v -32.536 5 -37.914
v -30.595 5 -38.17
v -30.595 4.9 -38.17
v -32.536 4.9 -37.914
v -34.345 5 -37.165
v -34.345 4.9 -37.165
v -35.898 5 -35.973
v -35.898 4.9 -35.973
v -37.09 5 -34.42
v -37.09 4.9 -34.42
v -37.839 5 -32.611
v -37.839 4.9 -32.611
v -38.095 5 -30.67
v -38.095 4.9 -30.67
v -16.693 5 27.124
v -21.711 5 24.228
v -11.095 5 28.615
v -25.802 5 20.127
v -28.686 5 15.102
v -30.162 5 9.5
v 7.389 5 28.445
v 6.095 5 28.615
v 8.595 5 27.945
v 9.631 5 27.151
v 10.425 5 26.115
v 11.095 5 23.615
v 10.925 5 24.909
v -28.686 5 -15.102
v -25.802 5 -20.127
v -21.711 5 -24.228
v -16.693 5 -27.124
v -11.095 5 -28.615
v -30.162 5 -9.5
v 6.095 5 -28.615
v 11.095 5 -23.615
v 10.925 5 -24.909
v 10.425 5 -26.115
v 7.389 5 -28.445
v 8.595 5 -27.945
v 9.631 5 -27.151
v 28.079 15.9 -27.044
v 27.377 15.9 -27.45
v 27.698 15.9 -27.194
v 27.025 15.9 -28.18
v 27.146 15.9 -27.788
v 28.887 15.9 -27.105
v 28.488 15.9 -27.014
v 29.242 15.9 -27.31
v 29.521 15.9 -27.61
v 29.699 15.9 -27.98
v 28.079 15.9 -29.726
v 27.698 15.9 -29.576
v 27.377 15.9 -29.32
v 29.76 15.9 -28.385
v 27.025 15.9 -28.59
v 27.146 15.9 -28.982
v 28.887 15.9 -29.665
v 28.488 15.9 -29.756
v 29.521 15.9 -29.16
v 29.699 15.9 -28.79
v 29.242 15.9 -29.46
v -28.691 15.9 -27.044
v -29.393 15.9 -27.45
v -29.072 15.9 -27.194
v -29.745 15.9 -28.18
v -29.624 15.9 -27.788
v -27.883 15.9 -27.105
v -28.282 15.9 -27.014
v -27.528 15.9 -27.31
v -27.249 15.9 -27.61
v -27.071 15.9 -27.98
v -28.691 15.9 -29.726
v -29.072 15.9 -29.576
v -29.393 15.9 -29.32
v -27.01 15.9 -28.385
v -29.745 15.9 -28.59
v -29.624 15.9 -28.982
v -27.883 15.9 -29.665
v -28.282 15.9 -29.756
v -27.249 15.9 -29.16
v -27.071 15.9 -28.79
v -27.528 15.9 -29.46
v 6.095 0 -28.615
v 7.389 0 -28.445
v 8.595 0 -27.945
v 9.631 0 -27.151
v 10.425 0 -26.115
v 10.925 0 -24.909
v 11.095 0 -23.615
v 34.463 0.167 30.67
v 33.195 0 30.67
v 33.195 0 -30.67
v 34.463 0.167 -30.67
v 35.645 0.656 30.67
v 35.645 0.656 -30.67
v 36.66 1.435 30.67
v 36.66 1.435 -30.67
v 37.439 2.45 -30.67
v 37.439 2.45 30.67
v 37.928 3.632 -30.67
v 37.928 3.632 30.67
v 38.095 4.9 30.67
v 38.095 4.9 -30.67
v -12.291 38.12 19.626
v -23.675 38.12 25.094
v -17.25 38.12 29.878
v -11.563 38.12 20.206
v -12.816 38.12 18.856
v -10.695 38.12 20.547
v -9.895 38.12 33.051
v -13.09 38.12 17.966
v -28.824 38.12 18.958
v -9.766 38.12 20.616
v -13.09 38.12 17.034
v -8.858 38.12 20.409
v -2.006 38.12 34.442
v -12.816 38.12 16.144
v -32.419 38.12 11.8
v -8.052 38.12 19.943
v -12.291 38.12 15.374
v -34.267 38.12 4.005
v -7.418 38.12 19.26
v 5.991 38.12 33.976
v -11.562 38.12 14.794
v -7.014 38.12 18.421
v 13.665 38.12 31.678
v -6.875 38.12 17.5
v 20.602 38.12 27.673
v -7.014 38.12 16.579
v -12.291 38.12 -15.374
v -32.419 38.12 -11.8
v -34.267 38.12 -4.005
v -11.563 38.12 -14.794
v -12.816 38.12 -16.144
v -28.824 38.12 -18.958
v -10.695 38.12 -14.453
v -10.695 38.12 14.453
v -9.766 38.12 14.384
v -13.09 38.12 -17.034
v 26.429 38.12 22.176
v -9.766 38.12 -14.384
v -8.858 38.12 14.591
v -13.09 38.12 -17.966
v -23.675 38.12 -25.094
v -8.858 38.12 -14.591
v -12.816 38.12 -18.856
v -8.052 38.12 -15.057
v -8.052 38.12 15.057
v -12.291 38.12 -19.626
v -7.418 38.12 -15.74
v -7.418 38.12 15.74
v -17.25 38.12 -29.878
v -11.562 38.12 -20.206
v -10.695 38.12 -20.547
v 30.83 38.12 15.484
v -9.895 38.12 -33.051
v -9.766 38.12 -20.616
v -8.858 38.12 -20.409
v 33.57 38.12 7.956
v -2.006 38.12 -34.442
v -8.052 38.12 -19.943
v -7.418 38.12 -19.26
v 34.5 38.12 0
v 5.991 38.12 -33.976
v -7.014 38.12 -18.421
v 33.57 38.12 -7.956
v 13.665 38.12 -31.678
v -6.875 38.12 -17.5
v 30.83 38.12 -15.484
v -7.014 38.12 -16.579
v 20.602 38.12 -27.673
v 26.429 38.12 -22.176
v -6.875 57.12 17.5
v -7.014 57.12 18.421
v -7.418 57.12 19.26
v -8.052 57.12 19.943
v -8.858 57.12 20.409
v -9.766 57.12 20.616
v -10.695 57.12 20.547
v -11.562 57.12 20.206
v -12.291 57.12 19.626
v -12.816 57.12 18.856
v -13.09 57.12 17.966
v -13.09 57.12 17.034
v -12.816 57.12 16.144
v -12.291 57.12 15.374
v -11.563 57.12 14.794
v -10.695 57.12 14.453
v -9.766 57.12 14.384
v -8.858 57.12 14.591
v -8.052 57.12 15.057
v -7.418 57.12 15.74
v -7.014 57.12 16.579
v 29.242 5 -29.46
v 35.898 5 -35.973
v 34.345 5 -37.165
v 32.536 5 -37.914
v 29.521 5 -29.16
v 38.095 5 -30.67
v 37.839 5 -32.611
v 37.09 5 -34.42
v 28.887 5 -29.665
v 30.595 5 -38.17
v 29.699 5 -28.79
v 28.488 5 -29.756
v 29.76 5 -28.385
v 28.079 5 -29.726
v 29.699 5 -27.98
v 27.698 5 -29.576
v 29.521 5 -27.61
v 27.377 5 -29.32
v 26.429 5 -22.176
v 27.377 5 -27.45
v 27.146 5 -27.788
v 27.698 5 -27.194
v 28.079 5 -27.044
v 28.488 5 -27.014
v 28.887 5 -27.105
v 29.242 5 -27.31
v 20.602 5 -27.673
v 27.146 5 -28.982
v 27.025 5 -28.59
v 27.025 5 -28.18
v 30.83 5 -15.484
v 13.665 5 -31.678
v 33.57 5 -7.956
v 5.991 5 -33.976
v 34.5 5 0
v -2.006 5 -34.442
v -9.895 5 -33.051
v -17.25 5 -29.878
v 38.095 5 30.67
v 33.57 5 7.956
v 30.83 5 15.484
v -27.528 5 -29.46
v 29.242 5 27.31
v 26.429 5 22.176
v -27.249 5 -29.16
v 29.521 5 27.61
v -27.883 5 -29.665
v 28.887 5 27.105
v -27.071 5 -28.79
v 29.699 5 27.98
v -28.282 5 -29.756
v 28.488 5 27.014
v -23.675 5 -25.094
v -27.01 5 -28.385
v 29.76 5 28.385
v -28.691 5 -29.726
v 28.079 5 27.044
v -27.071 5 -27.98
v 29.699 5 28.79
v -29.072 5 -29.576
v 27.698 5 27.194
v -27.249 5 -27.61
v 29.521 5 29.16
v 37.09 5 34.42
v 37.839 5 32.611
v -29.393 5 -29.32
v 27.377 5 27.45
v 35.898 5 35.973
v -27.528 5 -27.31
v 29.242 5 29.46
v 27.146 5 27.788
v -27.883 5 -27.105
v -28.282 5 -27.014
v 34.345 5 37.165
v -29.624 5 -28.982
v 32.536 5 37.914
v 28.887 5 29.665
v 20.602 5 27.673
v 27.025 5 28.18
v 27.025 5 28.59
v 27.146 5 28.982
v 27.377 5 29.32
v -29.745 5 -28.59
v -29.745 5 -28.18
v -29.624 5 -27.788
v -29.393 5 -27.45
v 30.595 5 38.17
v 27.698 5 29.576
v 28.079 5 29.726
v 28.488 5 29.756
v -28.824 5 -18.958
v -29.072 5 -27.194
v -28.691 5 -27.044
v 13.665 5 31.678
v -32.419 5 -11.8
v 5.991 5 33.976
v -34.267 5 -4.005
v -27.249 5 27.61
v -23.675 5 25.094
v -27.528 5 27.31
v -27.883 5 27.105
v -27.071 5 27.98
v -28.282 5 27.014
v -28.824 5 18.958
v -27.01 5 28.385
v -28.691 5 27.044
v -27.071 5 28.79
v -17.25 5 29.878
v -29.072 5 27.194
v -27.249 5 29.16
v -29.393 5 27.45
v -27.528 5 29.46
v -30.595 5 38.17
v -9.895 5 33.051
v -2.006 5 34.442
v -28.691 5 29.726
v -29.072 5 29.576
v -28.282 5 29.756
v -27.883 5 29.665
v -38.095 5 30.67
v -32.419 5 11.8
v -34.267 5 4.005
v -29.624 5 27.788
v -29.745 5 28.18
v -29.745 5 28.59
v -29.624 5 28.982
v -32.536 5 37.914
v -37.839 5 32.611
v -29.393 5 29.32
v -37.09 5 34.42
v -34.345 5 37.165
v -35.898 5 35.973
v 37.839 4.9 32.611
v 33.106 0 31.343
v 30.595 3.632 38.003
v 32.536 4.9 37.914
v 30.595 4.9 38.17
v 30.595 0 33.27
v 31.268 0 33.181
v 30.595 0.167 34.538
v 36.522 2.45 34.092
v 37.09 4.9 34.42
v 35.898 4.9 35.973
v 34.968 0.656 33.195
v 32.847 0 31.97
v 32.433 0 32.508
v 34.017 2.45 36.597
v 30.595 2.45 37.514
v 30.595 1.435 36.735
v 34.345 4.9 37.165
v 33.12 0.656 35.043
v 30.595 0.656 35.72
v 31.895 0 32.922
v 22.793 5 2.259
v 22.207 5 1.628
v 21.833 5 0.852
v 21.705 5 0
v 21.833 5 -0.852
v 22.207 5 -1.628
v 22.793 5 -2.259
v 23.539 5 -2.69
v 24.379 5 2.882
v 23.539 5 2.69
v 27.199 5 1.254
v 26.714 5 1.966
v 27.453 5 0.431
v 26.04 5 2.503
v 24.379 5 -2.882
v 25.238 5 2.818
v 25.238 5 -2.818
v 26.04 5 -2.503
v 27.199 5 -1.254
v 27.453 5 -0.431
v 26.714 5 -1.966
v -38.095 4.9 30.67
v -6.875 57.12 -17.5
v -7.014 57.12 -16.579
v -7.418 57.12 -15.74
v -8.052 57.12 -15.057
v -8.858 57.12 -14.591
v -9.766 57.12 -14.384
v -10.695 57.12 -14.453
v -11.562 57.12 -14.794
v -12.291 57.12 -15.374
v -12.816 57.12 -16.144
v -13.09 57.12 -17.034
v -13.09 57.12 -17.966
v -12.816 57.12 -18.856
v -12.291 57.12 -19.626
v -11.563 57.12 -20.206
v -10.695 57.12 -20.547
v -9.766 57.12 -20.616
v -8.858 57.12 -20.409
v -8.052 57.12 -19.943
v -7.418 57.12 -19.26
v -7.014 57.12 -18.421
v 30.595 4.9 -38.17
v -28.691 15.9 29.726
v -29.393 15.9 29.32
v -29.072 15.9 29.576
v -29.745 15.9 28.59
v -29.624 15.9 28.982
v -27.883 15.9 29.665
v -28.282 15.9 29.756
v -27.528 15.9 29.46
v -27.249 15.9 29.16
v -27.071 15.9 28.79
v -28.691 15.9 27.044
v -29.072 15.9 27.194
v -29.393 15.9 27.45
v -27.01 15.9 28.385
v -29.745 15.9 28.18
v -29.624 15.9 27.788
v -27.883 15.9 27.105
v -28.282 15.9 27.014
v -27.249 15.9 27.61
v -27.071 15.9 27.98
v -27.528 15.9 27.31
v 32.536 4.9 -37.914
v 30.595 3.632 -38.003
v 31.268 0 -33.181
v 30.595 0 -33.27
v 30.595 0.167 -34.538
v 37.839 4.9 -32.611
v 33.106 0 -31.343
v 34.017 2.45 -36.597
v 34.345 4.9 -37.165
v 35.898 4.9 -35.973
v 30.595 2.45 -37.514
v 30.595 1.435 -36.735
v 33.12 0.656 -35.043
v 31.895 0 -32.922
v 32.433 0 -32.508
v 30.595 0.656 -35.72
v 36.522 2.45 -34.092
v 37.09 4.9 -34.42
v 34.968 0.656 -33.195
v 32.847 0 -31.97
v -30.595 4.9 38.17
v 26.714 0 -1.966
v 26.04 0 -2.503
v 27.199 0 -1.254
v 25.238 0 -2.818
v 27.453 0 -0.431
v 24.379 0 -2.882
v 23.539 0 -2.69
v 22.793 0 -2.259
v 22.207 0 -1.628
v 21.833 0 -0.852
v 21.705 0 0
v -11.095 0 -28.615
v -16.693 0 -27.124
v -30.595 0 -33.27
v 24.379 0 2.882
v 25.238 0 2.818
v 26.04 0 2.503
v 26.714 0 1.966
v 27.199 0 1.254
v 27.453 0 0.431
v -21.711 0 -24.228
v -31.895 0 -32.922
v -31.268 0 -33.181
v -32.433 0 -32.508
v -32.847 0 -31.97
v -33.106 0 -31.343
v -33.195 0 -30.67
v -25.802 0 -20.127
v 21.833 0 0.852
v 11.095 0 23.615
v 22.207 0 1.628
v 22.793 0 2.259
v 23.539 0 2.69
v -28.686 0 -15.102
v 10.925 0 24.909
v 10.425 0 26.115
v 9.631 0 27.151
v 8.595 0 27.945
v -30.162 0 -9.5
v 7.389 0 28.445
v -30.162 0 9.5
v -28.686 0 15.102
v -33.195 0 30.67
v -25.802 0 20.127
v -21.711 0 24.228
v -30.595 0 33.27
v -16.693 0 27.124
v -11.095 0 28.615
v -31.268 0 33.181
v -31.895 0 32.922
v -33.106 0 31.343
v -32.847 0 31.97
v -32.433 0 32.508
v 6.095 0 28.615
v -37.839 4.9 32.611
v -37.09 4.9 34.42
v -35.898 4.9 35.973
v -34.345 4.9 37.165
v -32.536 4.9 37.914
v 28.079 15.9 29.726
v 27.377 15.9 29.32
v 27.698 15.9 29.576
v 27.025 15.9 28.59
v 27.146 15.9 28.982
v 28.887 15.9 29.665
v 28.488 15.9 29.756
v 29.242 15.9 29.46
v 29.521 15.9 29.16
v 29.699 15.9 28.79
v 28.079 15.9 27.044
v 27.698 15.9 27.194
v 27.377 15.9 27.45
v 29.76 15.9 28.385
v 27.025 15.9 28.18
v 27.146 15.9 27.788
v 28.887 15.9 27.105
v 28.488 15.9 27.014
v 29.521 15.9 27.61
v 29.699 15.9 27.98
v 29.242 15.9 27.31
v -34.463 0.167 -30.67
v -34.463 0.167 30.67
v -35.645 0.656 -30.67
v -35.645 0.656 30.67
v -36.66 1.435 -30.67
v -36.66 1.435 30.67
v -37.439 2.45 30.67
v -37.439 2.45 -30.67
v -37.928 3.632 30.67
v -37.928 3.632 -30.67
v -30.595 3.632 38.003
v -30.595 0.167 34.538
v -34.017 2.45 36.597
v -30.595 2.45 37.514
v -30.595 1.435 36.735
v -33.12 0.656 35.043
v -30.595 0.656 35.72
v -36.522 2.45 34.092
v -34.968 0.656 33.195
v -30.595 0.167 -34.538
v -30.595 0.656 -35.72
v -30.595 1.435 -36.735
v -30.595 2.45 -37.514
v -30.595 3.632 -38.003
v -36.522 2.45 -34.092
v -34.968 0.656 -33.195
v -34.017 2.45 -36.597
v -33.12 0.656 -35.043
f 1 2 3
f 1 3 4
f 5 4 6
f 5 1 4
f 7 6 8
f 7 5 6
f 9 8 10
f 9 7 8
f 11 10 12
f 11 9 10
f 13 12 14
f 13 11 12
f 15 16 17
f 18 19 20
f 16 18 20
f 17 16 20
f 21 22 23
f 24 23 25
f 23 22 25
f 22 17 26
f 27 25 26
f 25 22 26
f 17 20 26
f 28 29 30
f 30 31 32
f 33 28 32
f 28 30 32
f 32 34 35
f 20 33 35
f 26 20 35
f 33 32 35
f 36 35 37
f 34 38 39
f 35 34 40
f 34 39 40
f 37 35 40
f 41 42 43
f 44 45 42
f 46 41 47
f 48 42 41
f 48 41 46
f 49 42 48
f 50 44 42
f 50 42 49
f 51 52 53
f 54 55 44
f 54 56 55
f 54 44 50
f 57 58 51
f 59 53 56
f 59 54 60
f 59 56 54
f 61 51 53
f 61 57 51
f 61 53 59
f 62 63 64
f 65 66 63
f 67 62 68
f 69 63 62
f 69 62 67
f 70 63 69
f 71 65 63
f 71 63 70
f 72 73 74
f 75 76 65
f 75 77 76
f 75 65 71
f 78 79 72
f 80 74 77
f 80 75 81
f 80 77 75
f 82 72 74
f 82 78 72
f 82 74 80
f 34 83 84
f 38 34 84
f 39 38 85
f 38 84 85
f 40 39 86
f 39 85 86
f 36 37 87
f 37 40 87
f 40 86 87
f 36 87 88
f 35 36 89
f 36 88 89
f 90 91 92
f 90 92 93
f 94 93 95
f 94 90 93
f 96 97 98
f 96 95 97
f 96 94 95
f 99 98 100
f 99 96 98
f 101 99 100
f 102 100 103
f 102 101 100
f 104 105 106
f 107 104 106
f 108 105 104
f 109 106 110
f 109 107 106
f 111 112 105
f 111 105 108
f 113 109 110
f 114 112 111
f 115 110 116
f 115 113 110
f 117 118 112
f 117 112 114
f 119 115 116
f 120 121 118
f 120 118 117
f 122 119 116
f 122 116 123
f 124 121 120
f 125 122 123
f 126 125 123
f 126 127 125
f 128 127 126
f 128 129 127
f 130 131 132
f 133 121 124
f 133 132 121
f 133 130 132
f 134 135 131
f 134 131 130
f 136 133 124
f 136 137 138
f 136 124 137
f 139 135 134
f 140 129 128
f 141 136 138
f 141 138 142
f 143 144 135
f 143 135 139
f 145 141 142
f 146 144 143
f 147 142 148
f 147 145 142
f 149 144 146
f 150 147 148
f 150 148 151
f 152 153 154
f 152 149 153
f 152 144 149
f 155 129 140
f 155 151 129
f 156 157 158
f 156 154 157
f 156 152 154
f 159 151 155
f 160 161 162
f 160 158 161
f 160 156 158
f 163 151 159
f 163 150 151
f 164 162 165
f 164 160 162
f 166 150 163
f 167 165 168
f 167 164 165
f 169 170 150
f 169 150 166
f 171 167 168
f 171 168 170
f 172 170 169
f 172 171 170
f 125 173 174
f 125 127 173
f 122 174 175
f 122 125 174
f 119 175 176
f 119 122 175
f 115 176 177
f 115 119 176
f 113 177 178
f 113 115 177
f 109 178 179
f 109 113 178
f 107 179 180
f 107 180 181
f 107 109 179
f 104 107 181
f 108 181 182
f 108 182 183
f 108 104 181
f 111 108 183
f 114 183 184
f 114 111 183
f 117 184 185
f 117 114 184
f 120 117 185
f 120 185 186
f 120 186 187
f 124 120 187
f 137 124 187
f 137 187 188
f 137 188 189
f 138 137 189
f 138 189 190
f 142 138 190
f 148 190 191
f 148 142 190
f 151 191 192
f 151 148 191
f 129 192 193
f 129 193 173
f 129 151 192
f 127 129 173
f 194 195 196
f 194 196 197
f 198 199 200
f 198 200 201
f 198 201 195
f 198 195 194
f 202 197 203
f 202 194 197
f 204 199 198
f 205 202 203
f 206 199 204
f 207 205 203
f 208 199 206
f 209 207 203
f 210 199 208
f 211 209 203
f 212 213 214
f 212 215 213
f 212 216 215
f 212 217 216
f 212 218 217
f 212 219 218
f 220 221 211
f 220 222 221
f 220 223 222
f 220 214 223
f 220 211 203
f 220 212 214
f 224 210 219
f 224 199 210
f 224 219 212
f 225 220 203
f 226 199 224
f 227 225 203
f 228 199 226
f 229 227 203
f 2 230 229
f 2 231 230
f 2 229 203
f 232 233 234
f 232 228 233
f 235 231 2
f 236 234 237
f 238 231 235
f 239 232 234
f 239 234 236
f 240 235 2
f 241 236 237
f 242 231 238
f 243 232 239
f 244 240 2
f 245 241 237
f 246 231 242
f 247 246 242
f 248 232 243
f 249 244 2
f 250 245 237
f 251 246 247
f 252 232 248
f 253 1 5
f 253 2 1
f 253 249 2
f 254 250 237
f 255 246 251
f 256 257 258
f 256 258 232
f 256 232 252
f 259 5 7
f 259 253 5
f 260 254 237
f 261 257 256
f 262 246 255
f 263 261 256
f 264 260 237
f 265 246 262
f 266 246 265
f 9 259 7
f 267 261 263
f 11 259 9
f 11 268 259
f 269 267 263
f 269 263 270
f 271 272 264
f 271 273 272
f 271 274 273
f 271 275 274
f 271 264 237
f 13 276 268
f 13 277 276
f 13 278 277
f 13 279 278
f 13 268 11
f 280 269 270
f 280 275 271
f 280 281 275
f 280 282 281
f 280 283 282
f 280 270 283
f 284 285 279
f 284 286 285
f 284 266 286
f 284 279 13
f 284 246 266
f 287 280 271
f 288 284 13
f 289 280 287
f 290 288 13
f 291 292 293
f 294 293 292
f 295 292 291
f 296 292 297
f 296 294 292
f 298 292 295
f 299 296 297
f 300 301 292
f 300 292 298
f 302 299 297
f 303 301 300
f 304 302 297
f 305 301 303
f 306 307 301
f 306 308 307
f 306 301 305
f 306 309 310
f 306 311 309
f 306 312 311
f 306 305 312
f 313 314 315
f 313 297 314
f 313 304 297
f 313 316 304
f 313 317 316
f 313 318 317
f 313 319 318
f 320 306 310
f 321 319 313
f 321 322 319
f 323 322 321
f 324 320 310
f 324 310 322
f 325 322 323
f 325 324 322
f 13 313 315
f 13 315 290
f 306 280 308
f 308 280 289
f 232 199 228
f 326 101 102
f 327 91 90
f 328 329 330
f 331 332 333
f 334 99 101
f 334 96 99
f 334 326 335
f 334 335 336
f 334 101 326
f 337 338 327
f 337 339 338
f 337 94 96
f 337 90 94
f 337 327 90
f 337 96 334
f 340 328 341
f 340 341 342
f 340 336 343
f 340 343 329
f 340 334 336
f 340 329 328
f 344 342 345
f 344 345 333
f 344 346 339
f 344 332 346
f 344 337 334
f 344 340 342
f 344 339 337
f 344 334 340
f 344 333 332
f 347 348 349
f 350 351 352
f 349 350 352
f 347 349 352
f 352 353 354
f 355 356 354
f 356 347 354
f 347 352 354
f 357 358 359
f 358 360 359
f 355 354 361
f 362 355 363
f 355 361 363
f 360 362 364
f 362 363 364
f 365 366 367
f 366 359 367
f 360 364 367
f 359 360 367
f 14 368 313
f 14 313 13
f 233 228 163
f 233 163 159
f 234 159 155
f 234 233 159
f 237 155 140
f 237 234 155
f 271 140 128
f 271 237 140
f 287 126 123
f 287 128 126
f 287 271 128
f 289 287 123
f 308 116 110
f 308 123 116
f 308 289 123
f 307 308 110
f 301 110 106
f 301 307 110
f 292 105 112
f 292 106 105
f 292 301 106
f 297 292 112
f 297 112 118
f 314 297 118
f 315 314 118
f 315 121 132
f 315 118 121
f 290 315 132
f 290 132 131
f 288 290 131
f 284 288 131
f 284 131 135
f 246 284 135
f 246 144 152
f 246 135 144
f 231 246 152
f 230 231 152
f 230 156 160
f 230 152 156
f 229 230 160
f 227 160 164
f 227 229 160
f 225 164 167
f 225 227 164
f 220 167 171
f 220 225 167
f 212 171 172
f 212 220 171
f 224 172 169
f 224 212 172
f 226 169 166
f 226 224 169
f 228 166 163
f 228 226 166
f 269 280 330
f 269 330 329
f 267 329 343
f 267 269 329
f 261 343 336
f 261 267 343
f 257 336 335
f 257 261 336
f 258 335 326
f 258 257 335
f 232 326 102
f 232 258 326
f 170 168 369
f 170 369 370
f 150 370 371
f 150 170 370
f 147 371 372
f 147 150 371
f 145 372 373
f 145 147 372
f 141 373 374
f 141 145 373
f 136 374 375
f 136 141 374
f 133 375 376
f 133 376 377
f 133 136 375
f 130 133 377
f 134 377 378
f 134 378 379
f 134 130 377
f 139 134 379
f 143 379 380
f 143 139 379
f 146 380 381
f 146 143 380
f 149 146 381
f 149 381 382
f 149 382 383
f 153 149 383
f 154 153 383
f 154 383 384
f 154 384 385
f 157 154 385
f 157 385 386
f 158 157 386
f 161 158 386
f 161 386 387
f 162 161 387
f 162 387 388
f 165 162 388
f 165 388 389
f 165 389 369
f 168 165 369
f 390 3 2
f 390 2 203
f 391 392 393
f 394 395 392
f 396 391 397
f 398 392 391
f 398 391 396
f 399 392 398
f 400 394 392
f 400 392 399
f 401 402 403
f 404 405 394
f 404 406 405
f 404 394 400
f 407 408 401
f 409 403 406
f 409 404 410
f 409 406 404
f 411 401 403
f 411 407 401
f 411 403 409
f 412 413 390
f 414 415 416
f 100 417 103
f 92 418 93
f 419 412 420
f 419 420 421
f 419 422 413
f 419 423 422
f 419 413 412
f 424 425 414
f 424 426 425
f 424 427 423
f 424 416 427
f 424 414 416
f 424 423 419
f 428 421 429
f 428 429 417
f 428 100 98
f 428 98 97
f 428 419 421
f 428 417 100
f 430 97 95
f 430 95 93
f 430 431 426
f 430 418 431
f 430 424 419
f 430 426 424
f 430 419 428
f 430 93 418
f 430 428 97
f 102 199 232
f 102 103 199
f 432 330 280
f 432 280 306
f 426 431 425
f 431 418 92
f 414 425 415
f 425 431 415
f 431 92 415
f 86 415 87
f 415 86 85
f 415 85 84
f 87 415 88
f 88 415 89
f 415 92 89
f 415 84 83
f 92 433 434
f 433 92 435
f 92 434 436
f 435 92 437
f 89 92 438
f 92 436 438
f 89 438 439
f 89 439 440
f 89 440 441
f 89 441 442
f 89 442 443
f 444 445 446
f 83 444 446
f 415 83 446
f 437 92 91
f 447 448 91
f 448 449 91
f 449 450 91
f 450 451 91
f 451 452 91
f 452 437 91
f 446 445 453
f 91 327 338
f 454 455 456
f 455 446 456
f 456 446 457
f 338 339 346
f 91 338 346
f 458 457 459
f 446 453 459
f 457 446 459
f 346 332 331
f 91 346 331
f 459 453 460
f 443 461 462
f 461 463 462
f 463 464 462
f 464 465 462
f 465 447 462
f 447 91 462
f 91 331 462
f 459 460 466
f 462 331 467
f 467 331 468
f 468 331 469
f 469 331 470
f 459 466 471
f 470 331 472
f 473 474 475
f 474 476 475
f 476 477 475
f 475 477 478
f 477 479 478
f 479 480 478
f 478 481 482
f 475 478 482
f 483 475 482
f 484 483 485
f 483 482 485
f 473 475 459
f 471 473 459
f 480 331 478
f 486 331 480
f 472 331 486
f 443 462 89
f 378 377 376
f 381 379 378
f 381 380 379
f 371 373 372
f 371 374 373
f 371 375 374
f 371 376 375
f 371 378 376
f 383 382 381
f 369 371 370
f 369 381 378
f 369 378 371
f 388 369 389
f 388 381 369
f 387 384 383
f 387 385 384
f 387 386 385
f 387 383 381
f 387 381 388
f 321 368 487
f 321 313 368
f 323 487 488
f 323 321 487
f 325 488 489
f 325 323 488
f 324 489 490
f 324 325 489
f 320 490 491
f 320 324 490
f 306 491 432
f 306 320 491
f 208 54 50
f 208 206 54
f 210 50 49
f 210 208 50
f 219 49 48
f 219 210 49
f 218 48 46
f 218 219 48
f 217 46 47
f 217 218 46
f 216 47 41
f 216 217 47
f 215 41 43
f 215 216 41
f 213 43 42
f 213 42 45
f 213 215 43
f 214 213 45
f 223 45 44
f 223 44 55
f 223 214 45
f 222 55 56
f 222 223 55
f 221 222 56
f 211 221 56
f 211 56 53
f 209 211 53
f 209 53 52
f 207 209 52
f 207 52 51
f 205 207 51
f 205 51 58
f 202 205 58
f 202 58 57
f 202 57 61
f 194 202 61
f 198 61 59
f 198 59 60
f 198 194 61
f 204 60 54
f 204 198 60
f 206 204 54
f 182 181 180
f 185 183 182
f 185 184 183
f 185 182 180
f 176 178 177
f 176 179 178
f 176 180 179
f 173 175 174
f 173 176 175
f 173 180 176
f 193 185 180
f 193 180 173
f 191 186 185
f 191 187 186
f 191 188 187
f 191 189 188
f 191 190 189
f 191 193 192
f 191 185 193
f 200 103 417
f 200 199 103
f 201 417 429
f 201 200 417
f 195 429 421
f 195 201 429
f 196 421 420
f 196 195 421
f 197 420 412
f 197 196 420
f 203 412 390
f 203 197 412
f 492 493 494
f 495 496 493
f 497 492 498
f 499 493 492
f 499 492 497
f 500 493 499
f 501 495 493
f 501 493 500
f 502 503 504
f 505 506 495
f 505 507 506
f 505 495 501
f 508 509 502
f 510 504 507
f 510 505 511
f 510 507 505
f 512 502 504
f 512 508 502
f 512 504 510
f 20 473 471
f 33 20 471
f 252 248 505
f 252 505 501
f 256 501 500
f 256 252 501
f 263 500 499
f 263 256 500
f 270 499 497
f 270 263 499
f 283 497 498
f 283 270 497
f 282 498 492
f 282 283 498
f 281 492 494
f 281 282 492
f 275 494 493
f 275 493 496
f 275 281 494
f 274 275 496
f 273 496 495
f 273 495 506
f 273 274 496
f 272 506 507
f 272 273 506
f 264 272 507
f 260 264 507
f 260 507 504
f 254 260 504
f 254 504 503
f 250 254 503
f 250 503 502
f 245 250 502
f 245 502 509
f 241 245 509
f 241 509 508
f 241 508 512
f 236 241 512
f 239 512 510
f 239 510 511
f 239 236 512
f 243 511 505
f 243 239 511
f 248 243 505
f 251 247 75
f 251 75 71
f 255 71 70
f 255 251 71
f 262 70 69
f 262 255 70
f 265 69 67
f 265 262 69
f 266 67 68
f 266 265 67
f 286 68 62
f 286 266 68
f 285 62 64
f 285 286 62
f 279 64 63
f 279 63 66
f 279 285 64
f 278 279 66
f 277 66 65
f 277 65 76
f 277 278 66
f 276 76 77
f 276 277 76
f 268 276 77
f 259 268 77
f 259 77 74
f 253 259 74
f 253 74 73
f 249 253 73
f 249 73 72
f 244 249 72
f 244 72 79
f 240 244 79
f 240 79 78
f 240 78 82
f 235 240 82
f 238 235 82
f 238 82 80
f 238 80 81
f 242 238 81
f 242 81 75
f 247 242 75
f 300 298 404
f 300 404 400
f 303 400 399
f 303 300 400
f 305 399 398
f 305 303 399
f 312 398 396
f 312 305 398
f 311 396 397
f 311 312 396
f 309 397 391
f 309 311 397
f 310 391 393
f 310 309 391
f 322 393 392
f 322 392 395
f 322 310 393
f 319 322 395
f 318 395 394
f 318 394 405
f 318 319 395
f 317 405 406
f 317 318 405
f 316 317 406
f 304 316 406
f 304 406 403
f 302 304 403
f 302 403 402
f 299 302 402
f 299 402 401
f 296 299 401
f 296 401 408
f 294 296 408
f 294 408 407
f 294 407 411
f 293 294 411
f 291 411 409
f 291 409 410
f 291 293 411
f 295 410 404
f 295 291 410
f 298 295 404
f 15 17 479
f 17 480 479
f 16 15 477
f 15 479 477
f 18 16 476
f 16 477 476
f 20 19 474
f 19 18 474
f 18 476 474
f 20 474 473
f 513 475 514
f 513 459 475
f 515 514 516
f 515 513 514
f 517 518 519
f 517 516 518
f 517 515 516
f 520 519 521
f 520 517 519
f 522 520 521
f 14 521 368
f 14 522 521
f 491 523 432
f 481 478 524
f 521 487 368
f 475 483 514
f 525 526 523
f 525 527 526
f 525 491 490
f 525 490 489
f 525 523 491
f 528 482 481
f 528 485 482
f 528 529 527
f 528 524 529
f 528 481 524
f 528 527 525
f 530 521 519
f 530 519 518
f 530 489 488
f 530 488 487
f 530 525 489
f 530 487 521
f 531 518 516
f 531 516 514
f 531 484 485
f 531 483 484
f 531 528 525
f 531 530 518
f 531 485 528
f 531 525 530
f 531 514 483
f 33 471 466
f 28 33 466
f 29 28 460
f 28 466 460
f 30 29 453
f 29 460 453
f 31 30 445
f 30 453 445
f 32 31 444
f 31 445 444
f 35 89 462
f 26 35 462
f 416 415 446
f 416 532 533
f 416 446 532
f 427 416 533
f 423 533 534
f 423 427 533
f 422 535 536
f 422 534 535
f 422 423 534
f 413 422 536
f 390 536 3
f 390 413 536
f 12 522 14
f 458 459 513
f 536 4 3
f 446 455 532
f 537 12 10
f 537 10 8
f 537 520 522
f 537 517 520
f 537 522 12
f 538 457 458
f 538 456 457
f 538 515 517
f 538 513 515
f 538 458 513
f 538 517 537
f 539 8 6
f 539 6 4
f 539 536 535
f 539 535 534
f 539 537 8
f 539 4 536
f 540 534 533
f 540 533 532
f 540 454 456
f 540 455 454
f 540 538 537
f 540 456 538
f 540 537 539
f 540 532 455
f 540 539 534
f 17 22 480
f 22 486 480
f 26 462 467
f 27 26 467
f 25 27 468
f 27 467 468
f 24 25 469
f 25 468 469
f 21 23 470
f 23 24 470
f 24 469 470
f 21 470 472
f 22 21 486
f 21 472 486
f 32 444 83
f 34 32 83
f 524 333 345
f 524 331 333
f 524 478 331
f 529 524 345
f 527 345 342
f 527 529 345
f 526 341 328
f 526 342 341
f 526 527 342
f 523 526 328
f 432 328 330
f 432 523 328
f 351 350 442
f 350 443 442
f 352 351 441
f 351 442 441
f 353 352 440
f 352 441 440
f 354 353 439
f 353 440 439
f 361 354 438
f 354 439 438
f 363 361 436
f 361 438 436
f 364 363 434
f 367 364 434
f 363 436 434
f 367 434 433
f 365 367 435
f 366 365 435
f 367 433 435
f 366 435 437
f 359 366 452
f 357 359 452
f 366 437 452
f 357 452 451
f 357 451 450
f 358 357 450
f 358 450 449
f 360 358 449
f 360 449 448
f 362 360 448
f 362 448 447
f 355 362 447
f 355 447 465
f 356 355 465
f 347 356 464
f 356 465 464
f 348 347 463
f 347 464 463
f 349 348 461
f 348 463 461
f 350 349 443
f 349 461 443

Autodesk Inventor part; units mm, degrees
ref_plane "YZ Plane" through (0, 0, 0) normal (1, 0, 0) x (0, 1, 0)
ref_plane "XZ Plane" through (0, 0, 0) normal (0, 1, 0) x (-1, 0, 0)
ref_plane "XY Plane" through (0, 0, 0) normal (0, 0, 1) x (1, 0, 0)
sketch "Sketch1" plane through (0, 0, 0) normal (0, 1, 0) x (-1, 0, 0)
  line L0 (-38.095, 38.17) -> (38.095, 38.17)
  line L1 (38.095, 38.17) -> (38.095, -38.17)
  line L2 (38.095, -38.17) -> (-38.095, -38.17)
  line L3 (-38.095, -38.17) -> (-38.095, 38.17)
  line L4 (-38.095, 38.17) -> (38.095, -38.17) construction
  line L5 (38.095, 38.17) -> (-38.095, -38.17) construction
  line L6 (-6.095, 28.615) -> (11.095, 28.615)
  line L7 (11.095, -28.615) -> (-6.095, -28.615)
  line L8 (-11.095, -23.615) -> (-11.095, 23.615)
  line L9 (-11.095, 28.615) -> (11.095, -28.615) construction
  line L10 (11.095, 28.615) -> (-11.095, -28.615) construction
  line L11 (30.1625, 9.5) -> (30.1625, -9.5)
  arc A0 (30.1625, 9.5) -> (11.095, 28.615) centre (8.2631, 6.7226) ccw
  line L12 (38.095, 0) -> (-38.095, 0)
  arc A1 (11.095, -28.615) -> (30.1625, -9.5) centre (8.2631, -6.7226) ccw
  arc A2 (-6.095, 28.615) -> (-11.095, 23.615) centre (-6.095, 23.615) ccw
  arc A3 (-11.095, -23.615) -> (-6.095, -28.615) centre (-6.095, -23.615) ccw
  line L13 (-11.095, 0) -> (-38.095, 0)
  circle A4 centre (-24.595, 0) radius 2.89
  point P0 (0, 0)
  dimension "d0" = 76.34
  dimension "d1" = 76.19
  dimension "d2" = 57.23
  dimension "d3" = 22.19
  dimension "d5" = 5
  dimension "d6" = 5
  dimension "d7" = 5.78
extrude "Extrusion1" add sketch "Sketch1" along normal blind 5 contours L0 L1 L12 L11 A0 L6 A2 L8 A4 L3 | L12 A4 L8 A3 L7 A1 L11 L1 L2 L3
sketch "Sketch2" plane through (0, 5, 0) normal (0, 1, 0) x (1, 0, 0)
  circle A0 centre (0, 0) radius 34.5
  dimension "d10" = 69
extrude "Extrusion2" add sketch "Sketch2" along normal blind 33.12
sketch "Sketch3" plane through (0, 5, 0) normal (0, 1, 0) x (1, 0, 0)
  line L0 (28.385, 28.385) -> (-28.385, 28.385)
  line L1 (-28.385, 28.385) -> (-28.385, -28.385)
  line L2 (-28.385, -28.385) -> (28.385, -28.385)
  line L3 (28.385, -28.385) -> (28.385, 28.385)
  line L4 (28.385, 28.385) -> (-28.385, -28.385) construction
  line L5 (-28.385, 28.385) -> (28.385, -28.385) construction
  circle A0 centre (28.385, -28.385) radius 1.375
  circle A1 centre (-28.385, 28.385) radius 1.375
  circle A2 centre (-28.385, -28.385) radius 1.375
  circle A3 centre (28.385, 28.385) radius 1.375
  point P0 (0, 0)
  dimension "d13" = 56.77
  dimension "d14" = 56.77
  dimension "d15" = 2.75
  dimension "d16" = 2.75
  dimension "d18" = 2.75
  dimension "d19" = 2.75
extrude "Extrusion3" add sketch "Sketch3" along normal blind 10.9 contours A1 L1 L0 | L0 L1 A1 | A3 L3 L0 | L0 L3 A3 | A2 L2 L1 | L1 L2 A2 | A0 L2 L3 | L3 L2 A0
sketch "Sketch5" plane through (0, 38.12, 0) normal (0, 1, 0) x (1, 0, 0)
  line L0 (10, 17.5) -> (-10, 17.5)
  line L1 (-10, 17.5) -> (-10, -17.5)
  line L2 (-10, -17.5) -> (10, -17.5)
  line L3 (10, -17.5) -> (10, 17.5)
  line L4 (10, 17.5) -> (-10, -17.5) construction
  line L5 (-10, 17.5) -> (10, -17.5) construction
  circle A0 centre (-10, 17.5) radius 3.125
  circle A1 centre (-10, -17.5) radius 3.125
  point P0 (0, 0)
  dimension "d32" = 35
  dimension "d33" = 20
  dimension "d34" = 6.25
  dimension "d35" = 6.25
extrude "Extrusion5" add sketch "Sketch5" along normal blind 19 contours A0 L1 L0 | L0 L1 A0 | A1 L1 L2 | L2 L1 A1
fillet "Fillet1" radius 7.5 4 edges at (-38.095, 2.5, 38.17) (38.095, 2.5, 38.17) (38.095, 2.5, -38.17) (-38.095, 2.5, -38.17)
fillet "Fillet2" radius 4.9 8 edges at (-35.8983, 0, -35.9733) (-38.095, 0, 0) (-35.8983, 0, 35.9733) (0, 0, 38.17) (35.8983, 0, 35.9733) (38.095, 0, 0) (35.8983, 0, -35.9733) (0, 0, -38.17)
properties part number "MarionEICdcAmeter" material "Acetal Resin, Black"
